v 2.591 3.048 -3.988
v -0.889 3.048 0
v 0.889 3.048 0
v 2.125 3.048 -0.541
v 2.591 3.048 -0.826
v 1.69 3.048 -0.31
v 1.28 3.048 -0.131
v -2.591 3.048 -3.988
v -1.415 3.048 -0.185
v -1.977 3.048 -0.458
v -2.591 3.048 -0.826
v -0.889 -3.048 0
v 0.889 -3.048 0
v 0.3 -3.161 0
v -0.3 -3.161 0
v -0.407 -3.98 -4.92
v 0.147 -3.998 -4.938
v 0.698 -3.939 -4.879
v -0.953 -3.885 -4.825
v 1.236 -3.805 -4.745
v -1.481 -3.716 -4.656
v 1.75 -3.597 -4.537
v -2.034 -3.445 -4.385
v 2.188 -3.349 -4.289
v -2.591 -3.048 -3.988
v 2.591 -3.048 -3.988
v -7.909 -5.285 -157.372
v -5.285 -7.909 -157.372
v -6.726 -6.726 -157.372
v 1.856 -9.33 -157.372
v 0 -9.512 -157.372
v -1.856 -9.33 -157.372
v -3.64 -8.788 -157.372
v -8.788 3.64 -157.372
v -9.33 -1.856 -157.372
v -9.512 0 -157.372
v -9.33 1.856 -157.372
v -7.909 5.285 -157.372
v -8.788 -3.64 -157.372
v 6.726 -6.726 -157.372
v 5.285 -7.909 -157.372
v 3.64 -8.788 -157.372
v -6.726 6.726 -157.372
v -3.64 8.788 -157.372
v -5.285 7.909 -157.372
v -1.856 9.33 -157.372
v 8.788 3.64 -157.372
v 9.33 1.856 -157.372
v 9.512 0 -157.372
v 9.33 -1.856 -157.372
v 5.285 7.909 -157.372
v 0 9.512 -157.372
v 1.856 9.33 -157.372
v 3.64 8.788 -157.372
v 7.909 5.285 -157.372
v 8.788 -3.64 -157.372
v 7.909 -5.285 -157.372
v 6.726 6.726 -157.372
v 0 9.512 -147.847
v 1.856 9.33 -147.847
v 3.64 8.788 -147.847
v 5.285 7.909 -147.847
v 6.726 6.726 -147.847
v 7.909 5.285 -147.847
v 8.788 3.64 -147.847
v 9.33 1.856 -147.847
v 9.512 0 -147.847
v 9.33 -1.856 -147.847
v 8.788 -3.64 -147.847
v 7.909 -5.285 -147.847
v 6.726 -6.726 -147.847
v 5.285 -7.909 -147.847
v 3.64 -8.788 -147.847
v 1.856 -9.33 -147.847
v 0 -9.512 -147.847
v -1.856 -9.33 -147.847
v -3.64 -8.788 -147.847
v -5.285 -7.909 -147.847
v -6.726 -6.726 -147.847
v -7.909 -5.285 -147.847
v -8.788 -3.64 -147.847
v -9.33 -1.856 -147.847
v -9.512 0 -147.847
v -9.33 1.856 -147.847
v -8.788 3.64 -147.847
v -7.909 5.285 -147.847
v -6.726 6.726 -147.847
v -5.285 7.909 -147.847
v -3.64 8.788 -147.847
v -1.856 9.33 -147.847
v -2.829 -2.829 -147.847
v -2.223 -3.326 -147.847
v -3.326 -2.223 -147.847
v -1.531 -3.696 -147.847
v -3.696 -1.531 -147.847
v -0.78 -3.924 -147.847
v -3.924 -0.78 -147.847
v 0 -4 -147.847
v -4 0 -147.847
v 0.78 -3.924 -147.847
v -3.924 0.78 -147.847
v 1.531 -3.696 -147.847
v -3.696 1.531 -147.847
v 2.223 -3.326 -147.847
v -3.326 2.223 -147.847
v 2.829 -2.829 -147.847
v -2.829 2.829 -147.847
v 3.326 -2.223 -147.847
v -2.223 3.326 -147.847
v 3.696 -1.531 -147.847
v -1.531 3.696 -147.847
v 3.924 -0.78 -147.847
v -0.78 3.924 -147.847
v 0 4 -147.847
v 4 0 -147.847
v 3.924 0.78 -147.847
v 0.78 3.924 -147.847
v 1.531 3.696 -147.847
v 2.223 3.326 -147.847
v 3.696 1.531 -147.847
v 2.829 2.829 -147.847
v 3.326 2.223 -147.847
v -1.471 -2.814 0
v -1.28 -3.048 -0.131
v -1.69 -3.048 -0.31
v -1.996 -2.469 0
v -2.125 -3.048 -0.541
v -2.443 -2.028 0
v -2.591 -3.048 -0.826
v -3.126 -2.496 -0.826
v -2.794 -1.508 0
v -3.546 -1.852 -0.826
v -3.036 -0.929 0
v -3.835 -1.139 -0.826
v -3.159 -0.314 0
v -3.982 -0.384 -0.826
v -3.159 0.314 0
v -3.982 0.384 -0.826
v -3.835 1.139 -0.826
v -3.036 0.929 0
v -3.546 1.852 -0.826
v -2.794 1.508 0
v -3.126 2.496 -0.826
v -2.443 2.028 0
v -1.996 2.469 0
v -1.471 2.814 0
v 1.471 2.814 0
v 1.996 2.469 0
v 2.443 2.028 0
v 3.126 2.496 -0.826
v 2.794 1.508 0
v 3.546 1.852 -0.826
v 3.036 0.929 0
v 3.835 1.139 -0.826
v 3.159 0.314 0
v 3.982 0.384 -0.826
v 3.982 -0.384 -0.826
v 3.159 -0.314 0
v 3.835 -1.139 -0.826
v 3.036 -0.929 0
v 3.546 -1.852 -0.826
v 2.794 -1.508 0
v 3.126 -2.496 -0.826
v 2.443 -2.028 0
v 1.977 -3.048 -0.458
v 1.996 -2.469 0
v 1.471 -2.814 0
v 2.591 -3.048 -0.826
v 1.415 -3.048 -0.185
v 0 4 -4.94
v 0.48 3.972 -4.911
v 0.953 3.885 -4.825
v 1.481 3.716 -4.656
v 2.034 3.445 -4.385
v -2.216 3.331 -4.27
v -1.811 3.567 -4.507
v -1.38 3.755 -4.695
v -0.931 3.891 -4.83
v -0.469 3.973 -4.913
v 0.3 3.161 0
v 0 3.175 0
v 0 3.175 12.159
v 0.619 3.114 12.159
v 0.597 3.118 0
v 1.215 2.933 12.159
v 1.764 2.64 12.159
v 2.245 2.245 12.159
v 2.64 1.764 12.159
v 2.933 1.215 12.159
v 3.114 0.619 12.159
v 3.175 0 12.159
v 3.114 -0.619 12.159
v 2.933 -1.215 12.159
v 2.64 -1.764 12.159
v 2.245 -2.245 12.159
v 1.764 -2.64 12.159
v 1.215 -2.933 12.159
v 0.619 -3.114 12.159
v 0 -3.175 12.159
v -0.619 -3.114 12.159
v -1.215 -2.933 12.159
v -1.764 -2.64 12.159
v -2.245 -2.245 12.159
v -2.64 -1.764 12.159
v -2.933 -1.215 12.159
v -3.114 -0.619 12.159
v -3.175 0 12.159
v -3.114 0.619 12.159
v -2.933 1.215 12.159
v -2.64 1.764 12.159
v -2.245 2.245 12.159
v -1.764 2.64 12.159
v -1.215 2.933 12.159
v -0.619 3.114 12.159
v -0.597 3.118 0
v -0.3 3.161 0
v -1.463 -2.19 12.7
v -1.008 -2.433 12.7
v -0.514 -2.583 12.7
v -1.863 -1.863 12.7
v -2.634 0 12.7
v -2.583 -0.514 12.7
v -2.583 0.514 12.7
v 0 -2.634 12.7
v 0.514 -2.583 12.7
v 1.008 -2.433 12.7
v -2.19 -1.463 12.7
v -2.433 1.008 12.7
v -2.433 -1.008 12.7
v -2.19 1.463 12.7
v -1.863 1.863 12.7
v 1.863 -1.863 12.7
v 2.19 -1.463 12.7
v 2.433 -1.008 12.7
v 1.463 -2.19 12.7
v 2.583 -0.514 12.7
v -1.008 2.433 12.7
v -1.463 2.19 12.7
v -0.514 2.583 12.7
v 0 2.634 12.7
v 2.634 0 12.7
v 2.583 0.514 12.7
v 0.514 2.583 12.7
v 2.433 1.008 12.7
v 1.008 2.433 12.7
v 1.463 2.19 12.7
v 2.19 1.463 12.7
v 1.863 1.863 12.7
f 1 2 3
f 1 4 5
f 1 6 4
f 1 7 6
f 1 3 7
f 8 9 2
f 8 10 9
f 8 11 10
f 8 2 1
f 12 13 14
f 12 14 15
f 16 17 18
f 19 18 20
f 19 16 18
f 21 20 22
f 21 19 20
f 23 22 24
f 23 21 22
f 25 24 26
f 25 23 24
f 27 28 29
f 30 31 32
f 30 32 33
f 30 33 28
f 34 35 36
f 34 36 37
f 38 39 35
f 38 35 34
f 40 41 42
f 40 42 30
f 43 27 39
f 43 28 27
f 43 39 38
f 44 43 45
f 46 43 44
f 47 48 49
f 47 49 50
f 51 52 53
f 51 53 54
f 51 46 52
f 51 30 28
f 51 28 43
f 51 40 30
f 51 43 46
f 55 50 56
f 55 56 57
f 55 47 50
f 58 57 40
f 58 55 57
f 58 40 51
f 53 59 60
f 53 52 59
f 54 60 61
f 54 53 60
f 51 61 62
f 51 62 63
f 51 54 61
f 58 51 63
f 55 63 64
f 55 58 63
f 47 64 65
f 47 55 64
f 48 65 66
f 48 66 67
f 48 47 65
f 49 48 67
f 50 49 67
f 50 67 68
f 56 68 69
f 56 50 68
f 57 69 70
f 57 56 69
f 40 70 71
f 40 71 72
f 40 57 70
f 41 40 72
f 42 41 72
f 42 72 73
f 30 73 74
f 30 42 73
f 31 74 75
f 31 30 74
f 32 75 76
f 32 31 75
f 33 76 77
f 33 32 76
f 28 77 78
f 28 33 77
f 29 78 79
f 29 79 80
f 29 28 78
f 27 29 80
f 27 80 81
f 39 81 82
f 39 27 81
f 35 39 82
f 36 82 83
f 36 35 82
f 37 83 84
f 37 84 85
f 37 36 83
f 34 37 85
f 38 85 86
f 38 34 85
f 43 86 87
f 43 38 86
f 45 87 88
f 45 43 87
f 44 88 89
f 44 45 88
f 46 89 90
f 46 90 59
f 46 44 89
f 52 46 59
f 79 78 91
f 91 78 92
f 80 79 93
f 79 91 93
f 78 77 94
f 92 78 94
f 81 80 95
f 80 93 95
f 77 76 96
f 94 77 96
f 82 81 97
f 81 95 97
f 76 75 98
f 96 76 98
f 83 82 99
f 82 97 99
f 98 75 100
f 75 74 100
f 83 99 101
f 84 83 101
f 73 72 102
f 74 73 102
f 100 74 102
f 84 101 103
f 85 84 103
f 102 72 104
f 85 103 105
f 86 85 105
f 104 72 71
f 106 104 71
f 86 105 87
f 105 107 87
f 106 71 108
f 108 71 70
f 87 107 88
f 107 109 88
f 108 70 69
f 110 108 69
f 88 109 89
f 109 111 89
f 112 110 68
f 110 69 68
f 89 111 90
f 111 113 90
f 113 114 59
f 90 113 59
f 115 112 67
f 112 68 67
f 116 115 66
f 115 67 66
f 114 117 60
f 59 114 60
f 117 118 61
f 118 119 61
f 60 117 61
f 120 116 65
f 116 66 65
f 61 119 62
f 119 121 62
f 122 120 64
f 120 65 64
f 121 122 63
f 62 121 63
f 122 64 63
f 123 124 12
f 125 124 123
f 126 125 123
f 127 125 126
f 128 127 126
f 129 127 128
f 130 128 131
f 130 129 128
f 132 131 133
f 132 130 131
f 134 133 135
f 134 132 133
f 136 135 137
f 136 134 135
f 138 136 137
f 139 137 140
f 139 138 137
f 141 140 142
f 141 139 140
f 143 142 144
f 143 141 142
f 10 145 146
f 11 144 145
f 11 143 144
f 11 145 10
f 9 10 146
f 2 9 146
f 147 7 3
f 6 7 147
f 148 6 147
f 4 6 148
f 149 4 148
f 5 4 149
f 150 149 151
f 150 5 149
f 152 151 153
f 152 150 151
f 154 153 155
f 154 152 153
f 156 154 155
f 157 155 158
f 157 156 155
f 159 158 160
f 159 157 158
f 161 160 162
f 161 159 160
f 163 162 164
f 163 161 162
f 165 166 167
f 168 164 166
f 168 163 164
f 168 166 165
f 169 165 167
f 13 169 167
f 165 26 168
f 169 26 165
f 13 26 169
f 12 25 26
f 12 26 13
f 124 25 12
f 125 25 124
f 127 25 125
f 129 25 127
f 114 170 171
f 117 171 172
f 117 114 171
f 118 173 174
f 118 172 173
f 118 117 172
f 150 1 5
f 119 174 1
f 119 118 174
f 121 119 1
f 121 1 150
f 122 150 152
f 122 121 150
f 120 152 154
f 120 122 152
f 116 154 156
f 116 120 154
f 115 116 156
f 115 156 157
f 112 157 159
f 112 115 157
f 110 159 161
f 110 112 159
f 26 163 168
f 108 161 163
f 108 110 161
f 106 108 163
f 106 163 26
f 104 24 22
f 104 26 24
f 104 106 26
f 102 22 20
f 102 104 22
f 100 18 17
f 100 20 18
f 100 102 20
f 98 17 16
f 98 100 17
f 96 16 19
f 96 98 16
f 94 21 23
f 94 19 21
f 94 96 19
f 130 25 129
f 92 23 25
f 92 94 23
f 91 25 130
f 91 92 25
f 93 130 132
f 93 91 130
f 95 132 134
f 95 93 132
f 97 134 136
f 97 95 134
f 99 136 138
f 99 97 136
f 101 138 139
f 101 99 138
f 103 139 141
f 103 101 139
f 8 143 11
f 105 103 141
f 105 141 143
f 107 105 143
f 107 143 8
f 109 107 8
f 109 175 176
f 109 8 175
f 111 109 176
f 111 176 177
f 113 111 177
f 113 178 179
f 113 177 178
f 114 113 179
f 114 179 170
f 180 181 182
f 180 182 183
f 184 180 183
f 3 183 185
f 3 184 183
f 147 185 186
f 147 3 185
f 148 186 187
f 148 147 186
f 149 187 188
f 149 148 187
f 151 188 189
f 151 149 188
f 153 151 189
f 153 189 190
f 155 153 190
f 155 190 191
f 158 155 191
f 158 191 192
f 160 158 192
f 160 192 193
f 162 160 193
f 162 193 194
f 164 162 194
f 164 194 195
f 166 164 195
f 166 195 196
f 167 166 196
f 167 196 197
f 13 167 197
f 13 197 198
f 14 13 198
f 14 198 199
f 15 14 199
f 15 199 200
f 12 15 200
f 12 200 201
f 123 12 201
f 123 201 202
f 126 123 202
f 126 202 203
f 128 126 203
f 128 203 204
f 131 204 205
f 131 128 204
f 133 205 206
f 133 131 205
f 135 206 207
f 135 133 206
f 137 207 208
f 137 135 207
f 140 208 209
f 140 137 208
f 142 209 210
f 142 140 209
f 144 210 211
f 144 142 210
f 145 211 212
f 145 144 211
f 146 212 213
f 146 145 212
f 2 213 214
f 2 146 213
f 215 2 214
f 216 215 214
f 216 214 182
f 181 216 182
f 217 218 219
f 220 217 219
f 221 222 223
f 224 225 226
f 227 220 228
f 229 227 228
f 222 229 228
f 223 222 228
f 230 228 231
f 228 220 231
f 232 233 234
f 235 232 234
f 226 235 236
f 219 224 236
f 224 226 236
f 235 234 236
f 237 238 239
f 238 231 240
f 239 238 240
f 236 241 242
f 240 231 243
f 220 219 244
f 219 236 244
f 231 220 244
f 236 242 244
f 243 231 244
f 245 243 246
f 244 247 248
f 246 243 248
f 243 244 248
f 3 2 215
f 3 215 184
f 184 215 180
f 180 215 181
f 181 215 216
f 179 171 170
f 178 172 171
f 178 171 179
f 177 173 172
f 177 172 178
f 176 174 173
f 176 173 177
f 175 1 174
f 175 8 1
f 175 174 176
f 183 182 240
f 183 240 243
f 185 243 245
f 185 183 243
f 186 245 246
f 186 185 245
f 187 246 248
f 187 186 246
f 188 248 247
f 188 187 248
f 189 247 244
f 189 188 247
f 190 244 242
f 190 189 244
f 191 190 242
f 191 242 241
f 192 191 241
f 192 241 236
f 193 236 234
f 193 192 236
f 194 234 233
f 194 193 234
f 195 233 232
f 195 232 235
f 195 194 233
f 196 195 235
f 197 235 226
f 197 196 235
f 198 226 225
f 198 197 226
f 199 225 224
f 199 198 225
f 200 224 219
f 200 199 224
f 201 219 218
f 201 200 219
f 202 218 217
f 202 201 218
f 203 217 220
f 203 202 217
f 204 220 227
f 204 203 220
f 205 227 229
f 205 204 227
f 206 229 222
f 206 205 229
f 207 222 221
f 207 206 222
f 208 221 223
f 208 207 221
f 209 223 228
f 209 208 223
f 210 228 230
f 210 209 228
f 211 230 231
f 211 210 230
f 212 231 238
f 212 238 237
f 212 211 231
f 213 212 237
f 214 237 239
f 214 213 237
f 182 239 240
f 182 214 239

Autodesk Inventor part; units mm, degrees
sketch "Sketch_1" plane through (0, 0, 0) normal (1, 0, 0) x (0, 1, 0)
  line L0 (0, -157.3721) -> (0, 12.7)
  line L1 (0, 12.7) -> (2.634, 12.7)
  line L2 (2.634, 12.7) -> (3.175, 12.159)
  line L3 (3.175, 12.159) -> (3.175, 0)
  line L4 (3.175, 0) -> (4.0005, -0.8255)
  line L5 (4.0005, -0.8255) -> (4.0005, -147.847)
  line L6 (4.0005, -147.847) -> (9.5123, -147.847)
  line L7 (9.5123, -147.847) -> (9.5123, -157.3721)
  line L8 (9.5123, -157.3721) -> (0, -157.3721)
  line L9 (0, -157.3721) -> (0, 12.7)
revolve "Revolution1" add sketch "Sketch_1" angle 360 about axis through (0, 0, -157.3721) along (0, 0, -1)
thread "Thread1" size "1/4-28 UNF" class "2A" standard "ANSI Unified Screw Threads" full length
sketch "Sketch_2" plane through (0, 0, 0) normal (1, 0, 0) x (0, 1, 0)
  line L0 (6.096, 0) -> (3.048, 0)
  line L1 (3.048, 0) -> (3.048, -3.9878)
  line L2 (3.048, -3.9878) -> (6.096, -7.0358)
  line L3 (6.096, -7.0358) -> (6.096, 0)
extrude "Extrusion1" cut sketch "Sketch_2" along normal mid plane 16.002
sketch "Sketch_3" plane through (0, 0, 0) normal (1, 0, 0) x (0, 1, 0)
  line L0 (-6.096, 0) -> (-6.096, -7.0358)
  line L1 (-6.096, -7.0358) -> (-3.048, -3.9878)
  line L2 (-3.048, -3.9878) -> (-3.048, 0)
  line L3 (-3.048, 0) -> (-6.096, 0)
extrude "Extrusion2" cut sketch "Sketch_3" along normal mid plane 16.002
ref_plane "conn_XY" through (0, 0, 0) normal (0, 0, -1) x (1, 0, 0)
ref_plane "conn_YZ" through (0, 0, 0) normal (1, 0, 0) x (0, -1, 0)
ref_plane "conn_ZX" through (0, 0, 0) normal (0, -1, 0) x (0, 0, -1)
properties part number "PR_OCG1-3/4x4" material "Stainless Steel"
